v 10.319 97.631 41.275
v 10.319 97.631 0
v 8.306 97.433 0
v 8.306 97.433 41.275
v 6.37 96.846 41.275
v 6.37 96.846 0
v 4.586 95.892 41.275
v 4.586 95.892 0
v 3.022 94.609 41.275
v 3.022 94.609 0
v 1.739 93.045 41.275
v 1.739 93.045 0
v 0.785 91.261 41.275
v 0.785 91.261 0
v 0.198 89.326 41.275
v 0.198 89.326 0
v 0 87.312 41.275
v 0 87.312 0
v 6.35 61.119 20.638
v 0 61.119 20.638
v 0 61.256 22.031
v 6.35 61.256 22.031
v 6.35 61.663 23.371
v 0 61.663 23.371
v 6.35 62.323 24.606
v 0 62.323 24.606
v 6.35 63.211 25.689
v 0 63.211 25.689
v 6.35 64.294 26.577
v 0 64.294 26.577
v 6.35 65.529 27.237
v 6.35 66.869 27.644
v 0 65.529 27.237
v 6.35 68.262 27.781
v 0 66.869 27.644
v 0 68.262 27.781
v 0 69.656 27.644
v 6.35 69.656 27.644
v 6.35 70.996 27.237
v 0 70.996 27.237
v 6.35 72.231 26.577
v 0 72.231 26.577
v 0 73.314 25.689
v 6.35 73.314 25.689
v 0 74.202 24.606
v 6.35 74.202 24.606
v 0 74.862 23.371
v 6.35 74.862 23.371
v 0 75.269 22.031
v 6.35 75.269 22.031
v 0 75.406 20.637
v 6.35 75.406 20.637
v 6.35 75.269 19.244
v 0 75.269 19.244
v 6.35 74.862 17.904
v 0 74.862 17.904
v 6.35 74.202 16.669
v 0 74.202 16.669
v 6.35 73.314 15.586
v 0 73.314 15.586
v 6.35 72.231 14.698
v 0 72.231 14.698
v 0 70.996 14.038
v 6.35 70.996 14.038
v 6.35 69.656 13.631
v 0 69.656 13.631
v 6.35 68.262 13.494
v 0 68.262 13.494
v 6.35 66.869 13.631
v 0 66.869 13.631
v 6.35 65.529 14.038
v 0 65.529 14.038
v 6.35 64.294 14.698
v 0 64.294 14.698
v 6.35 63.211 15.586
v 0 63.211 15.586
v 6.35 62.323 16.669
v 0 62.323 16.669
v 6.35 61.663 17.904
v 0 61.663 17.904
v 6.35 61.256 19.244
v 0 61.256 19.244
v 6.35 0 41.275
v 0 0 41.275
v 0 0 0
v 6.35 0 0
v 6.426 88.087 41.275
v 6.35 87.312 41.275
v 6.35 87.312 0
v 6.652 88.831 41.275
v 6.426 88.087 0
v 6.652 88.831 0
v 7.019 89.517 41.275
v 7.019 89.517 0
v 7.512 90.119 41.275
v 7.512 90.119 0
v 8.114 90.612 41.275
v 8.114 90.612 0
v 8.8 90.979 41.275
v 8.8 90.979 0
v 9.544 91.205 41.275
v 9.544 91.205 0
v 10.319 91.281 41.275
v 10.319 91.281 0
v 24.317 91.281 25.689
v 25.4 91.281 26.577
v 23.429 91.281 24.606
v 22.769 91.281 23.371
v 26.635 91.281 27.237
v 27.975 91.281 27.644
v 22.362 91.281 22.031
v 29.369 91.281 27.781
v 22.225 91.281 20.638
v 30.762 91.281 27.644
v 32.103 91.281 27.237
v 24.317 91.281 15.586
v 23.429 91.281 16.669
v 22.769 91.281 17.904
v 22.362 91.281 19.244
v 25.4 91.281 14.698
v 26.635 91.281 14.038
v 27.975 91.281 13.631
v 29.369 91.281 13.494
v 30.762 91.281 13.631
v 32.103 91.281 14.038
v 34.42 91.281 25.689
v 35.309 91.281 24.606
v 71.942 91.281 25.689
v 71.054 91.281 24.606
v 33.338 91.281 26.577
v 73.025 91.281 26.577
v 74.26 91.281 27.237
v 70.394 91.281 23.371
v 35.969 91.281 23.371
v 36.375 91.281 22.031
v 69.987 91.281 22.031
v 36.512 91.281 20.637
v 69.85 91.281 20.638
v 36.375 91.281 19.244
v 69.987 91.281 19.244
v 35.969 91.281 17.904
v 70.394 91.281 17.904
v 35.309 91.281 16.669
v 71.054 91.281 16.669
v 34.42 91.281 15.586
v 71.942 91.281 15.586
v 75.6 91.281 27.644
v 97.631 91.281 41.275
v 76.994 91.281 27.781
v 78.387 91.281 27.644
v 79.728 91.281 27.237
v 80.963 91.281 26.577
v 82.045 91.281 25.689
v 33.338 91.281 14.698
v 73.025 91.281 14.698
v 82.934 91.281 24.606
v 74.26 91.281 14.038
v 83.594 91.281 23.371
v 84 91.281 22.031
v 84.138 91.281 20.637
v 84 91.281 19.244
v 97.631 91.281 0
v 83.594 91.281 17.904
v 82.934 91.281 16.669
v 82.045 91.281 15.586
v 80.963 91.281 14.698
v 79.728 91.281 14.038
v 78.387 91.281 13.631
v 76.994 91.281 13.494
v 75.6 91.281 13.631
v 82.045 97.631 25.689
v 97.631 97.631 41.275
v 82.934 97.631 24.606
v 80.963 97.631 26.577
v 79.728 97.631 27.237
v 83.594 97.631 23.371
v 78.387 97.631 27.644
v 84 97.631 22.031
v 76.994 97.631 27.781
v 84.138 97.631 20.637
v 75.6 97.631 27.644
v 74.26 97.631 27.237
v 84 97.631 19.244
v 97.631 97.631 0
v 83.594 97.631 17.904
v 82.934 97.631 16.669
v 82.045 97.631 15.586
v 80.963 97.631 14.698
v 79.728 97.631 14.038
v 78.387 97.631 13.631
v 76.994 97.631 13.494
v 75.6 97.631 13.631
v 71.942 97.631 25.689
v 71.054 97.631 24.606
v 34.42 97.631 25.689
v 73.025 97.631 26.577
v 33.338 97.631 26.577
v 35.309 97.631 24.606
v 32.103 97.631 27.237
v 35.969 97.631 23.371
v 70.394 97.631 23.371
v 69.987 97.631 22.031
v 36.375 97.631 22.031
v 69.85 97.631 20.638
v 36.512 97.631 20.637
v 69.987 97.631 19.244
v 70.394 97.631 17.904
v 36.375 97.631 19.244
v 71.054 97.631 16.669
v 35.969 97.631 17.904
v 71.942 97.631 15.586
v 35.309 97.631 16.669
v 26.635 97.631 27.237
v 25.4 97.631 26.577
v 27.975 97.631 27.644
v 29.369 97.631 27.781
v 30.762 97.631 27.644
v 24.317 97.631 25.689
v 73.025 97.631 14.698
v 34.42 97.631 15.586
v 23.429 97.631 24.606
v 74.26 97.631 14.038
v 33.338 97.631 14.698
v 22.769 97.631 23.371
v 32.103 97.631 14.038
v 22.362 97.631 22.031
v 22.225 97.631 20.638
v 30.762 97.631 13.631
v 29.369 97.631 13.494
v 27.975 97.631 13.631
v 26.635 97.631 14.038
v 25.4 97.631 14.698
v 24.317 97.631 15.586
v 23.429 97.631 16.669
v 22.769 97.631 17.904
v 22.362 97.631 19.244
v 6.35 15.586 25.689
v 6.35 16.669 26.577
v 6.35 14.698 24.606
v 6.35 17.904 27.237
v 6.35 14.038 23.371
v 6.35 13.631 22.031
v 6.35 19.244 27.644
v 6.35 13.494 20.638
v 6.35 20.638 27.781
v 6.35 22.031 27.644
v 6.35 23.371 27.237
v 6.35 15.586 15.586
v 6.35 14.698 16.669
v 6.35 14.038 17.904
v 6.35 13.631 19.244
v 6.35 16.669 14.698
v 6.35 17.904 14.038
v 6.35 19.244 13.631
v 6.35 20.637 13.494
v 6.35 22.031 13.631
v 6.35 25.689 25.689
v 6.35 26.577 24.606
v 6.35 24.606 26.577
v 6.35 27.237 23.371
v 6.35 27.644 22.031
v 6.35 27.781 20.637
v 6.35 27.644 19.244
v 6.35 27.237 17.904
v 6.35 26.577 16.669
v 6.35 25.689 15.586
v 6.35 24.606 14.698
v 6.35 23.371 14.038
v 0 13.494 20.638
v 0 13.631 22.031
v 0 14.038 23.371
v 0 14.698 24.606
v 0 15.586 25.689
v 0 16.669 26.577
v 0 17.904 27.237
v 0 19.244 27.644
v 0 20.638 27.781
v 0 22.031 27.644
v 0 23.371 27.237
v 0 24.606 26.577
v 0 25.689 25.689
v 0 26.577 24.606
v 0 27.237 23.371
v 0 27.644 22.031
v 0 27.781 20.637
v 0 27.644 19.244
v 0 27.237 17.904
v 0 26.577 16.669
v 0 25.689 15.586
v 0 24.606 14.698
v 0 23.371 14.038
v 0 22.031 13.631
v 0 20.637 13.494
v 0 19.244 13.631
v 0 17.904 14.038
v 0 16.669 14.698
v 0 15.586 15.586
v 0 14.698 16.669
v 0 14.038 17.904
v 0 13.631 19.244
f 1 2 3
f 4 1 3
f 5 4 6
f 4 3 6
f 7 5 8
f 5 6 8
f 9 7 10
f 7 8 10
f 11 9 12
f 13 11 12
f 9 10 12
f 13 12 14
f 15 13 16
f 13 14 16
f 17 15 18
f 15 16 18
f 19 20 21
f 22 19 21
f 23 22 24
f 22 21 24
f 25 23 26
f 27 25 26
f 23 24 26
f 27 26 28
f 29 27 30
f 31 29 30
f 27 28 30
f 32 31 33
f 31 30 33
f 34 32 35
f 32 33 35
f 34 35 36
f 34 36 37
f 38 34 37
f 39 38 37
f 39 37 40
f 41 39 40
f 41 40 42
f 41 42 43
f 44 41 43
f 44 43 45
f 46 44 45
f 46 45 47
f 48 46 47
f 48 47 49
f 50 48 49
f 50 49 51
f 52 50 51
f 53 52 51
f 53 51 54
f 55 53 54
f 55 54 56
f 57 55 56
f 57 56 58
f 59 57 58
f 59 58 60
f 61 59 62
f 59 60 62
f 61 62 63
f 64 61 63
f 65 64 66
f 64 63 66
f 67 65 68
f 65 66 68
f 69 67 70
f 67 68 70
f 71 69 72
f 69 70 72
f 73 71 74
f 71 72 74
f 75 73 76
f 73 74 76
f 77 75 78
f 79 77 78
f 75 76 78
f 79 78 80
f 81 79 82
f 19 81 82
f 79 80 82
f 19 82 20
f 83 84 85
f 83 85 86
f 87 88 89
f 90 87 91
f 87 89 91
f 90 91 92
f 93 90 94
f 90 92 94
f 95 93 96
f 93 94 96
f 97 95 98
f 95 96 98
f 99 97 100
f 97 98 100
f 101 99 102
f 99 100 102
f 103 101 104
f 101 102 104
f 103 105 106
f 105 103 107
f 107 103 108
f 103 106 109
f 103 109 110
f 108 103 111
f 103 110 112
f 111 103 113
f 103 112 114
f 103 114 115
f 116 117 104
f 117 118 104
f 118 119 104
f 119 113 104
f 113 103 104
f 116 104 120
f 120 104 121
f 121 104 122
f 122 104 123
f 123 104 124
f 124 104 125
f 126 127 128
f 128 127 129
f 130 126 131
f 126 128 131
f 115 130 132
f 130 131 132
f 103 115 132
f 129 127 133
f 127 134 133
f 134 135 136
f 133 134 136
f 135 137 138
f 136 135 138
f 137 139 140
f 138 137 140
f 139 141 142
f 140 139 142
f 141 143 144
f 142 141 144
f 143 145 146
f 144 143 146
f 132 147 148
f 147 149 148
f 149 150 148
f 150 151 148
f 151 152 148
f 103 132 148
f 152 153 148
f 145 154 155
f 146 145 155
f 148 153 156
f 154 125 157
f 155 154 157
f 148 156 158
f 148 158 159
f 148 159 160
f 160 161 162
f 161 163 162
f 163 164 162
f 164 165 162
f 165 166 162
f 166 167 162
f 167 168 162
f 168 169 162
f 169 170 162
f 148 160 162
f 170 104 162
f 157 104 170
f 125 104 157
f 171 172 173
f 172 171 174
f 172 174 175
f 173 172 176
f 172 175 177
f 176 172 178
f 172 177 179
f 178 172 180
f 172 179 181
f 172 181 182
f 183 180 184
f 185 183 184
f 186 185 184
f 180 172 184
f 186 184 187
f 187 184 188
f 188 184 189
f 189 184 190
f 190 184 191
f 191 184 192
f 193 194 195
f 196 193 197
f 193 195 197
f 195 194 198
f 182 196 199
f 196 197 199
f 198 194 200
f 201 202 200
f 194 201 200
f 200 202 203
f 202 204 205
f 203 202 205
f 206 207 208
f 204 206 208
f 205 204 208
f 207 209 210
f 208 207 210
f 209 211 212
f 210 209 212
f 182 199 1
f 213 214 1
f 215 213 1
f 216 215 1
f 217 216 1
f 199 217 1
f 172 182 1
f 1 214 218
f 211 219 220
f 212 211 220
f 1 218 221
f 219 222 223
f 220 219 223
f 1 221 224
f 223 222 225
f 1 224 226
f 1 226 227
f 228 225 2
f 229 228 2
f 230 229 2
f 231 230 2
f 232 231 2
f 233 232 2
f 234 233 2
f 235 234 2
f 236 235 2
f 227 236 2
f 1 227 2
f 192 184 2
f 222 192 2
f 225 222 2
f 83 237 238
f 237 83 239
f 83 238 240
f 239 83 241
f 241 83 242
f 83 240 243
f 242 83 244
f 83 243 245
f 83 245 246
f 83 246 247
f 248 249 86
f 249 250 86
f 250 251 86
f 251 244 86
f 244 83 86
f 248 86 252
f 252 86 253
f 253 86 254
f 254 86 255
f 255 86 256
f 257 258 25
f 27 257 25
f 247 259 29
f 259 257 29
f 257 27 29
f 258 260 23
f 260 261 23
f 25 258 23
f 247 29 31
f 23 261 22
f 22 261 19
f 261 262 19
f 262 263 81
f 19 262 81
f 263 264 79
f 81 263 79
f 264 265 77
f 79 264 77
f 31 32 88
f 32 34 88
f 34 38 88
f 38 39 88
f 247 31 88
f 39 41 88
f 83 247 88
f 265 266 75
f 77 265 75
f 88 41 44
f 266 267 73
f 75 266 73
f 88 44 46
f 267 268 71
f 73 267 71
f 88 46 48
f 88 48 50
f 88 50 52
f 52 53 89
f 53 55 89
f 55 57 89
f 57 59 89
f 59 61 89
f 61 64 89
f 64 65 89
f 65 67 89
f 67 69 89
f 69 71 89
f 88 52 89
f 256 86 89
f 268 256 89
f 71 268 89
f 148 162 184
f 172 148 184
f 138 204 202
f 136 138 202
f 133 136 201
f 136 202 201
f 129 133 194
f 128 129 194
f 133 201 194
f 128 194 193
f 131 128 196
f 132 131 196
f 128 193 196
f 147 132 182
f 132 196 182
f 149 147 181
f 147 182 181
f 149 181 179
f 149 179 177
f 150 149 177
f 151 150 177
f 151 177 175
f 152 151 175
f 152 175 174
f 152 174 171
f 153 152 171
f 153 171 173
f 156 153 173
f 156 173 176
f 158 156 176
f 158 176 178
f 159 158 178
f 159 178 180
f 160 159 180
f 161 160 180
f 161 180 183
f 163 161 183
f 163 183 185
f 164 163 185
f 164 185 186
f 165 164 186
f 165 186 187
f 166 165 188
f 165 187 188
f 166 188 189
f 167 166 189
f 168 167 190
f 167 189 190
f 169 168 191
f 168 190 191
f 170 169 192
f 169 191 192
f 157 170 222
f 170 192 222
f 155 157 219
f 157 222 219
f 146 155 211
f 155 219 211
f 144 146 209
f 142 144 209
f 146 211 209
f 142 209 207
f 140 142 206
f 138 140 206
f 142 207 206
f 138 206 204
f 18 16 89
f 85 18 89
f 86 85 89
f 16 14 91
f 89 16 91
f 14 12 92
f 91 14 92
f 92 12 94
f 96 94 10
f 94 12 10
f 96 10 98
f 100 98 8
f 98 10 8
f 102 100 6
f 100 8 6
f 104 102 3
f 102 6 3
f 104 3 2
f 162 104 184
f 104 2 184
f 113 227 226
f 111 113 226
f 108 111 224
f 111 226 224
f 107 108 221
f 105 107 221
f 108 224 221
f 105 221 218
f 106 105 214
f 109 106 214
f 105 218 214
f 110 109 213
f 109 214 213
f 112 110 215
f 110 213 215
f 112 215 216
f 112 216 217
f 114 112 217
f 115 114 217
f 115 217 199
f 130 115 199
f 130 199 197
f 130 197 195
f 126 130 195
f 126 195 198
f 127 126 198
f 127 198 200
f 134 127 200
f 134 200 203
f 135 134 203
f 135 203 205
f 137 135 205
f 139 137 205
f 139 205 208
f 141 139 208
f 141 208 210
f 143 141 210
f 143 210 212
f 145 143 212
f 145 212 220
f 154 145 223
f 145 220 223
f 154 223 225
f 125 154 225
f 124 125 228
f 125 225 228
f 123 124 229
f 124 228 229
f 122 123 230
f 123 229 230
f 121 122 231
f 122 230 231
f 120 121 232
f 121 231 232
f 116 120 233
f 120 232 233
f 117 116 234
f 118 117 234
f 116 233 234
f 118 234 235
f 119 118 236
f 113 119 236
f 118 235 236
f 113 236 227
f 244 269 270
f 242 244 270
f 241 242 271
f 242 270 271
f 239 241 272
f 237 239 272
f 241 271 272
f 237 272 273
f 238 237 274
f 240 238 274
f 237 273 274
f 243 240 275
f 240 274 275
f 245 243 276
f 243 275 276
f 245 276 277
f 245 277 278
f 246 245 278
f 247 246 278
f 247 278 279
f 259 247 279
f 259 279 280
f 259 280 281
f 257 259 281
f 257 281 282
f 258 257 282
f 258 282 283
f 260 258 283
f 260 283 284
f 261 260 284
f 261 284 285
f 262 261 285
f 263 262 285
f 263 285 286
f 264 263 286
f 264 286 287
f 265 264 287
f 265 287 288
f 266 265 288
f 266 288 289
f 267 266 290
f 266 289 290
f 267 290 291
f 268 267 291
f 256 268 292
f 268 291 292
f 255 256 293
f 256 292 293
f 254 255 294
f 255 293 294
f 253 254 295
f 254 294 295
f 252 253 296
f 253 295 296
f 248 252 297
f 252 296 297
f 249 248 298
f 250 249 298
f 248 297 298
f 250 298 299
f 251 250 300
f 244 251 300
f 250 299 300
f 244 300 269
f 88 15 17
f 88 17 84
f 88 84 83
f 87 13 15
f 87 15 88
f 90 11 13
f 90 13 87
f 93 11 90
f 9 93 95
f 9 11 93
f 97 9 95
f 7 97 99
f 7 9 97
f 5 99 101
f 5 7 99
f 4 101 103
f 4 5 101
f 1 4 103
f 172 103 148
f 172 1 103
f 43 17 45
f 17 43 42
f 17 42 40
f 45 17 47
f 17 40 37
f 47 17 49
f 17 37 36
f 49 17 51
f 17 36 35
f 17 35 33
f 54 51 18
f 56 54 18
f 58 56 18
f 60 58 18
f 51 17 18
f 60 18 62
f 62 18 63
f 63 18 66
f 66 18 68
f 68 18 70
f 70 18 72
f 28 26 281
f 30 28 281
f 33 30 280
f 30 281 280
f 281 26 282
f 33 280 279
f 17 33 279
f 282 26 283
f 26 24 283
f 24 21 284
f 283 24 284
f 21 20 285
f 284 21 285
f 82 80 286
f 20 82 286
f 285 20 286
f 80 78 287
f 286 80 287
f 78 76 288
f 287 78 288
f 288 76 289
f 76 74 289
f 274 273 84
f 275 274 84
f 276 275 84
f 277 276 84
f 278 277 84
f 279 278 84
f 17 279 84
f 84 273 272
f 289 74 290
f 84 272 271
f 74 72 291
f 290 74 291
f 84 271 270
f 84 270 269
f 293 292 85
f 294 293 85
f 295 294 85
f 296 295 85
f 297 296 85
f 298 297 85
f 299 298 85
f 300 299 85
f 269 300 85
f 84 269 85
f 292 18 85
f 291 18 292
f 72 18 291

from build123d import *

# Parameters (mm, degrees)
F1_DEPTH = 41.275
F4_D     = 14.2875
F7_D     = 14.2875


# Not quite as in the source:
# - a length typed as a fraction of an inch, garbled in the dataset ("3 / 203.2 mm" for 3/8 in), is restored


with BuildPart() as f1:
    # F0 (on Top) → F1 (new body)
    with BuildSketch(Plane.XY):
        with BuildLine():
            ThreePointArc((10.31875, 97.63125), (3.0222919016, 94.6089580984), (0, 87.3125))
            Line((0, 87.3125), (0, 0))
            Line((0, 0), (6.35, 0))
            Line((6.35, 0), (6.35, 87.3125))
            ThreePointArc((6.35, 87.3125), (7.5124199622, 90.1188300378), (10.31875, 91.28125))
            Line((10.31875, 91.28125), (97.63125, 91.28125))
            Line((97.63125, 91.28125), (97.63125, 97.63125))
            Line((97.63125, 97.63125), (10.31875, 97.63125))
        make_face()
    extrude(amount=F1_DEPTH)

    # F4 (through all)
    with Locations(Plane.YZ.offset(6.35)):
        with Locations((20.6375, 20.6375), (68.2625, 20.6375)):
            Hole(F4_D / 2)

    # F7 (through all)
    with Locations(Plane.XZ.offset(-91.28125)):
        with Locations((29.36875, 20.6375), (76.99375, 20.6375)):
            Hole(F7_D / 2)


solid = f1.part
